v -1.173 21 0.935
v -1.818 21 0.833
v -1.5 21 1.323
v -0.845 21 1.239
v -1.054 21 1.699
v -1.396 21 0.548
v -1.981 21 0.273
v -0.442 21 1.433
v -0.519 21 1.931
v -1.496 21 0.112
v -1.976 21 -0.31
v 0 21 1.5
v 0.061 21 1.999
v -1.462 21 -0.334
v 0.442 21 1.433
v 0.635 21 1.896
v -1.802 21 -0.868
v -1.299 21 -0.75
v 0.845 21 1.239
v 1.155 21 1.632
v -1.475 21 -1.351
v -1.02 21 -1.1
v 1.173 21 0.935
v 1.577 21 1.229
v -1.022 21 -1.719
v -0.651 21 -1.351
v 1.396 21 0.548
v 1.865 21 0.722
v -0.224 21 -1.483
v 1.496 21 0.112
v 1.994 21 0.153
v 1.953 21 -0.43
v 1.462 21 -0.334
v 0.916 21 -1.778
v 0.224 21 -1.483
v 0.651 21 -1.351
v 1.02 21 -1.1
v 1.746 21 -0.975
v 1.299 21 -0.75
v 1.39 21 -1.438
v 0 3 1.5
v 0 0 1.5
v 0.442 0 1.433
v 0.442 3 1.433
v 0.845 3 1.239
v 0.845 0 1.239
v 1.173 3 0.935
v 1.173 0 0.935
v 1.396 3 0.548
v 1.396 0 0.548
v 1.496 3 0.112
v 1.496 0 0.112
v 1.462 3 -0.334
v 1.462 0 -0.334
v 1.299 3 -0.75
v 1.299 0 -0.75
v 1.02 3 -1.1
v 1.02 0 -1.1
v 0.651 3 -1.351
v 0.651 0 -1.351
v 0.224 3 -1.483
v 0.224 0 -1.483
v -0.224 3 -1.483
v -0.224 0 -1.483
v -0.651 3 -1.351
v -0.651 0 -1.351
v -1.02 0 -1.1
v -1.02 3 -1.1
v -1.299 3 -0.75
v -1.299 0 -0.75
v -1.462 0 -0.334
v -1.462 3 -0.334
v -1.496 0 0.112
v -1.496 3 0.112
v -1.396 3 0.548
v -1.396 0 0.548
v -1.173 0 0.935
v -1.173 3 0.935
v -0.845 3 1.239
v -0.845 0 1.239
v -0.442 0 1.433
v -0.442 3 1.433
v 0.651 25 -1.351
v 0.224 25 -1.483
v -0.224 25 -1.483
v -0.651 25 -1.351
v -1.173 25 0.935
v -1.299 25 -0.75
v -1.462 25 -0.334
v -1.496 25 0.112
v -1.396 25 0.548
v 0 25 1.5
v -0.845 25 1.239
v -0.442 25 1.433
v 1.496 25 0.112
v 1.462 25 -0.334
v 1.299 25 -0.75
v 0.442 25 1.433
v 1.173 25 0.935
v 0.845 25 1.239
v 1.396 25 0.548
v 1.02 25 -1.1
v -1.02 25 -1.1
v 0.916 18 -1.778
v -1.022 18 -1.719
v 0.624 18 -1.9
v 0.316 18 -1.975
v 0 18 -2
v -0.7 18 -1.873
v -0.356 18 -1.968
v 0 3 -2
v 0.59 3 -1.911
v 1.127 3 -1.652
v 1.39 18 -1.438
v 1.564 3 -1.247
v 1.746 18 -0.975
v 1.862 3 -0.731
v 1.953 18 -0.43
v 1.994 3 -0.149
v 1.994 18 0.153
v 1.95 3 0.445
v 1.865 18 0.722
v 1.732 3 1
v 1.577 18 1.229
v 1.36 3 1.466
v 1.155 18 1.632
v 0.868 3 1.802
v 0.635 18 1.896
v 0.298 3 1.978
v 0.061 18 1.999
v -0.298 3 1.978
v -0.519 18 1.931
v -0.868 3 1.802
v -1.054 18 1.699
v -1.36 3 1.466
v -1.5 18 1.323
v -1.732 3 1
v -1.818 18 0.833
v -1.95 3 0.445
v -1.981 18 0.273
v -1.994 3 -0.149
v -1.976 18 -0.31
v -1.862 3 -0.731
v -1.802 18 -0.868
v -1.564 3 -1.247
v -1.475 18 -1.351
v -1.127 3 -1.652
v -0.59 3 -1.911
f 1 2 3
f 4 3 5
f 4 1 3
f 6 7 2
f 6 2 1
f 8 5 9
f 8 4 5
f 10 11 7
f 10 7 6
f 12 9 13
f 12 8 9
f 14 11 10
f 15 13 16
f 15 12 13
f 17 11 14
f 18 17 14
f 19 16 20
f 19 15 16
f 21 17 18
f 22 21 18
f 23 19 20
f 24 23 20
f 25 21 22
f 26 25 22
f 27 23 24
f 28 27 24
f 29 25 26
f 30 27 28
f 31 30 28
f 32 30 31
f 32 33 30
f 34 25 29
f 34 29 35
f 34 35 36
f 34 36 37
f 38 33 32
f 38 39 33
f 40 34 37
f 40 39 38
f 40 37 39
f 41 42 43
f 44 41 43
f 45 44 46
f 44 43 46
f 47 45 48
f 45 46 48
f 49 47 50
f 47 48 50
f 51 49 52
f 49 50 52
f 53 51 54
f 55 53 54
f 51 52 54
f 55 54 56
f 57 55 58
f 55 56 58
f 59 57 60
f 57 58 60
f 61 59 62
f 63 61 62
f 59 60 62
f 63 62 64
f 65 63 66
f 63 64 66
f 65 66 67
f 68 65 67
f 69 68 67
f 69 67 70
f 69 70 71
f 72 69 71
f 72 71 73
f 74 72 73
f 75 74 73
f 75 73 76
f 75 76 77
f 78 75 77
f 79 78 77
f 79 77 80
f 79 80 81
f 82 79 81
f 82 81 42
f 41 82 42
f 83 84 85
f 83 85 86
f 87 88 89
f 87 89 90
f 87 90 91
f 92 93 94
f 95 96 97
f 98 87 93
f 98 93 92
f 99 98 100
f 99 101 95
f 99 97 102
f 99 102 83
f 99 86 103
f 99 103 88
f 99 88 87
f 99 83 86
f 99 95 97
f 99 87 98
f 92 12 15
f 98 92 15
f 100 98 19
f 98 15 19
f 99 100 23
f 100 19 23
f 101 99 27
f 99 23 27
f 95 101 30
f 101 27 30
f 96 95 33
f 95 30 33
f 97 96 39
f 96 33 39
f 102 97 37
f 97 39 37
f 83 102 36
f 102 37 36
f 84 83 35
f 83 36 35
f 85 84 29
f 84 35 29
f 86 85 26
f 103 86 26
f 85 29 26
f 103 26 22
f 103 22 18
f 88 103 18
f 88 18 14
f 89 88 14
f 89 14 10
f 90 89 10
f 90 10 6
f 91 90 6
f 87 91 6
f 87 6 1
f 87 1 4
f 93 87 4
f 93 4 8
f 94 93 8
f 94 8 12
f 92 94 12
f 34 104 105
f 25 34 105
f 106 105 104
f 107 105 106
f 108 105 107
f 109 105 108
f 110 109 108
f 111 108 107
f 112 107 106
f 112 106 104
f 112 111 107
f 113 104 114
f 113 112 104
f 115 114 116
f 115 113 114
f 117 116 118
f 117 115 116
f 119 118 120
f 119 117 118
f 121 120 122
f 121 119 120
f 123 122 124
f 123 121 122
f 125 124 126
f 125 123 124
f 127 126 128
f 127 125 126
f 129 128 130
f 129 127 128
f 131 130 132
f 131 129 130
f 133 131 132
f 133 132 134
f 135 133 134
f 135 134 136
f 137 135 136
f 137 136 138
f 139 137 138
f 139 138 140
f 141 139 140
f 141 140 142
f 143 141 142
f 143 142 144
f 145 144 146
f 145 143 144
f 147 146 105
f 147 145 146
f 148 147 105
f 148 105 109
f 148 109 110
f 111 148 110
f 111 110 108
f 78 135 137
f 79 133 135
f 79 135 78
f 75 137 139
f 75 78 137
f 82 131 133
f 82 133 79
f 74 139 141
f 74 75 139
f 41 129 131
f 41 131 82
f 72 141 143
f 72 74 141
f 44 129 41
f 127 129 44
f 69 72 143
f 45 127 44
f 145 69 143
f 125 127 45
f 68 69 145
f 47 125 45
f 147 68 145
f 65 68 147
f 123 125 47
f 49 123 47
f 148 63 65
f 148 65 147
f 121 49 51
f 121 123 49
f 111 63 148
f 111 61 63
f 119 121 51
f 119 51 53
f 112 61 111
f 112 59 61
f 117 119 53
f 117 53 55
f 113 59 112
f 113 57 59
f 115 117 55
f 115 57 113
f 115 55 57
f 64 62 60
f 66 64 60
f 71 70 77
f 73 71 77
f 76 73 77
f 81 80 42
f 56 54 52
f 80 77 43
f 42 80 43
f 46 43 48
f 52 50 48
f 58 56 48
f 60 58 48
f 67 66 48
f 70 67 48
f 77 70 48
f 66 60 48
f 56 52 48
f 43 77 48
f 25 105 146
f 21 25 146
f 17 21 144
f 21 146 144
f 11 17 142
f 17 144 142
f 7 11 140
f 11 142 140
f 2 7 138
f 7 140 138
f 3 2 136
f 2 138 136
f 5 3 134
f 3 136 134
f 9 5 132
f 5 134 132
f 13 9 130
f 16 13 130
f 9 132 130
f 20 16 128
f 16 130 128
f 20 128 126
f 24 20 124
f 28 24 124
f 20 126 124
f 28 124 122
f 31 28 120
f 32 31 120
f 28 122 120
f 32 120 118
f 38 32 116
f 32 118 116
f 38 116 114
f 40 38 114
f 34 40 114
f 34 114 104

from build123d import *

# Parameters (mm, degrees)
SKETCH_1_R      = 1.5
EXTRUDE_1_DEPTH = 25
EXTRUDE_START   = 15
SKETCH_2_R      = 2
SKETCH_2_R_2    = 1.5
EXTRUDE_2_DEPTH = 15
SKETCH_3_R      = 1.5
EXTRUDE_3_DEPTH = 3


with BuildPart() as part:
    # 草图1 → 凸台-拉伸1 (new body)
    with BuildSketch(Plane(origin=(0, 0, 0), x_dir=(1, 0, 0), z_dir=(0, 1, 0))):
        with Locations(Location((0, 0, 0), (0, 0, 270))):
            Circle(SKETCH_1_R)
    extrude(amount=EXTRUDE_1_DEPTH)

    # 草图2 → 凸台-拉伸2 (add)
    with BuildSketch(Plane(origin=(0, 18, 0), x_dir=(-1, 0, 0), z_dir=(0, -1, 0)).offset(EXTRUDE_START)):
        with Locations(Location((0, 0, 0), (0, 0, 90))):
            Circle(SKETCH_2_R)
        with Locations(Location((0, 0, 0), (0, 0, 90))):
            Circle(SKETCH_2_R_2, mode=Mode.SUBTRACT)
    extrude(amount=-EXTRUDE_2_DEPTH)

    # 草图3 → 凸台-拉伸3 (add)
    with BuildSketch(Plane(origin=(0, 18, 0), x_dir=(1, 0, 0), z_dir=(0, 1, 0))):
        with BuildLine():
            Line((0.91625301, 1.777774007), (-1.022249701, 1.719012958))
            ThreePointArc((-1.022249701, 1.719012958), (0.060597358, -1.999081779), (0.91625301, 1.777774007))
        make_face()
        with Locations(Location((0, 0, 0), (0, 0, 90))):
            Circle(SKETCH_3_R, mode=Mode.SUBTRACT)
    extrude(amount=EXTRUDE_3_DEPTH)


solid = part.part
